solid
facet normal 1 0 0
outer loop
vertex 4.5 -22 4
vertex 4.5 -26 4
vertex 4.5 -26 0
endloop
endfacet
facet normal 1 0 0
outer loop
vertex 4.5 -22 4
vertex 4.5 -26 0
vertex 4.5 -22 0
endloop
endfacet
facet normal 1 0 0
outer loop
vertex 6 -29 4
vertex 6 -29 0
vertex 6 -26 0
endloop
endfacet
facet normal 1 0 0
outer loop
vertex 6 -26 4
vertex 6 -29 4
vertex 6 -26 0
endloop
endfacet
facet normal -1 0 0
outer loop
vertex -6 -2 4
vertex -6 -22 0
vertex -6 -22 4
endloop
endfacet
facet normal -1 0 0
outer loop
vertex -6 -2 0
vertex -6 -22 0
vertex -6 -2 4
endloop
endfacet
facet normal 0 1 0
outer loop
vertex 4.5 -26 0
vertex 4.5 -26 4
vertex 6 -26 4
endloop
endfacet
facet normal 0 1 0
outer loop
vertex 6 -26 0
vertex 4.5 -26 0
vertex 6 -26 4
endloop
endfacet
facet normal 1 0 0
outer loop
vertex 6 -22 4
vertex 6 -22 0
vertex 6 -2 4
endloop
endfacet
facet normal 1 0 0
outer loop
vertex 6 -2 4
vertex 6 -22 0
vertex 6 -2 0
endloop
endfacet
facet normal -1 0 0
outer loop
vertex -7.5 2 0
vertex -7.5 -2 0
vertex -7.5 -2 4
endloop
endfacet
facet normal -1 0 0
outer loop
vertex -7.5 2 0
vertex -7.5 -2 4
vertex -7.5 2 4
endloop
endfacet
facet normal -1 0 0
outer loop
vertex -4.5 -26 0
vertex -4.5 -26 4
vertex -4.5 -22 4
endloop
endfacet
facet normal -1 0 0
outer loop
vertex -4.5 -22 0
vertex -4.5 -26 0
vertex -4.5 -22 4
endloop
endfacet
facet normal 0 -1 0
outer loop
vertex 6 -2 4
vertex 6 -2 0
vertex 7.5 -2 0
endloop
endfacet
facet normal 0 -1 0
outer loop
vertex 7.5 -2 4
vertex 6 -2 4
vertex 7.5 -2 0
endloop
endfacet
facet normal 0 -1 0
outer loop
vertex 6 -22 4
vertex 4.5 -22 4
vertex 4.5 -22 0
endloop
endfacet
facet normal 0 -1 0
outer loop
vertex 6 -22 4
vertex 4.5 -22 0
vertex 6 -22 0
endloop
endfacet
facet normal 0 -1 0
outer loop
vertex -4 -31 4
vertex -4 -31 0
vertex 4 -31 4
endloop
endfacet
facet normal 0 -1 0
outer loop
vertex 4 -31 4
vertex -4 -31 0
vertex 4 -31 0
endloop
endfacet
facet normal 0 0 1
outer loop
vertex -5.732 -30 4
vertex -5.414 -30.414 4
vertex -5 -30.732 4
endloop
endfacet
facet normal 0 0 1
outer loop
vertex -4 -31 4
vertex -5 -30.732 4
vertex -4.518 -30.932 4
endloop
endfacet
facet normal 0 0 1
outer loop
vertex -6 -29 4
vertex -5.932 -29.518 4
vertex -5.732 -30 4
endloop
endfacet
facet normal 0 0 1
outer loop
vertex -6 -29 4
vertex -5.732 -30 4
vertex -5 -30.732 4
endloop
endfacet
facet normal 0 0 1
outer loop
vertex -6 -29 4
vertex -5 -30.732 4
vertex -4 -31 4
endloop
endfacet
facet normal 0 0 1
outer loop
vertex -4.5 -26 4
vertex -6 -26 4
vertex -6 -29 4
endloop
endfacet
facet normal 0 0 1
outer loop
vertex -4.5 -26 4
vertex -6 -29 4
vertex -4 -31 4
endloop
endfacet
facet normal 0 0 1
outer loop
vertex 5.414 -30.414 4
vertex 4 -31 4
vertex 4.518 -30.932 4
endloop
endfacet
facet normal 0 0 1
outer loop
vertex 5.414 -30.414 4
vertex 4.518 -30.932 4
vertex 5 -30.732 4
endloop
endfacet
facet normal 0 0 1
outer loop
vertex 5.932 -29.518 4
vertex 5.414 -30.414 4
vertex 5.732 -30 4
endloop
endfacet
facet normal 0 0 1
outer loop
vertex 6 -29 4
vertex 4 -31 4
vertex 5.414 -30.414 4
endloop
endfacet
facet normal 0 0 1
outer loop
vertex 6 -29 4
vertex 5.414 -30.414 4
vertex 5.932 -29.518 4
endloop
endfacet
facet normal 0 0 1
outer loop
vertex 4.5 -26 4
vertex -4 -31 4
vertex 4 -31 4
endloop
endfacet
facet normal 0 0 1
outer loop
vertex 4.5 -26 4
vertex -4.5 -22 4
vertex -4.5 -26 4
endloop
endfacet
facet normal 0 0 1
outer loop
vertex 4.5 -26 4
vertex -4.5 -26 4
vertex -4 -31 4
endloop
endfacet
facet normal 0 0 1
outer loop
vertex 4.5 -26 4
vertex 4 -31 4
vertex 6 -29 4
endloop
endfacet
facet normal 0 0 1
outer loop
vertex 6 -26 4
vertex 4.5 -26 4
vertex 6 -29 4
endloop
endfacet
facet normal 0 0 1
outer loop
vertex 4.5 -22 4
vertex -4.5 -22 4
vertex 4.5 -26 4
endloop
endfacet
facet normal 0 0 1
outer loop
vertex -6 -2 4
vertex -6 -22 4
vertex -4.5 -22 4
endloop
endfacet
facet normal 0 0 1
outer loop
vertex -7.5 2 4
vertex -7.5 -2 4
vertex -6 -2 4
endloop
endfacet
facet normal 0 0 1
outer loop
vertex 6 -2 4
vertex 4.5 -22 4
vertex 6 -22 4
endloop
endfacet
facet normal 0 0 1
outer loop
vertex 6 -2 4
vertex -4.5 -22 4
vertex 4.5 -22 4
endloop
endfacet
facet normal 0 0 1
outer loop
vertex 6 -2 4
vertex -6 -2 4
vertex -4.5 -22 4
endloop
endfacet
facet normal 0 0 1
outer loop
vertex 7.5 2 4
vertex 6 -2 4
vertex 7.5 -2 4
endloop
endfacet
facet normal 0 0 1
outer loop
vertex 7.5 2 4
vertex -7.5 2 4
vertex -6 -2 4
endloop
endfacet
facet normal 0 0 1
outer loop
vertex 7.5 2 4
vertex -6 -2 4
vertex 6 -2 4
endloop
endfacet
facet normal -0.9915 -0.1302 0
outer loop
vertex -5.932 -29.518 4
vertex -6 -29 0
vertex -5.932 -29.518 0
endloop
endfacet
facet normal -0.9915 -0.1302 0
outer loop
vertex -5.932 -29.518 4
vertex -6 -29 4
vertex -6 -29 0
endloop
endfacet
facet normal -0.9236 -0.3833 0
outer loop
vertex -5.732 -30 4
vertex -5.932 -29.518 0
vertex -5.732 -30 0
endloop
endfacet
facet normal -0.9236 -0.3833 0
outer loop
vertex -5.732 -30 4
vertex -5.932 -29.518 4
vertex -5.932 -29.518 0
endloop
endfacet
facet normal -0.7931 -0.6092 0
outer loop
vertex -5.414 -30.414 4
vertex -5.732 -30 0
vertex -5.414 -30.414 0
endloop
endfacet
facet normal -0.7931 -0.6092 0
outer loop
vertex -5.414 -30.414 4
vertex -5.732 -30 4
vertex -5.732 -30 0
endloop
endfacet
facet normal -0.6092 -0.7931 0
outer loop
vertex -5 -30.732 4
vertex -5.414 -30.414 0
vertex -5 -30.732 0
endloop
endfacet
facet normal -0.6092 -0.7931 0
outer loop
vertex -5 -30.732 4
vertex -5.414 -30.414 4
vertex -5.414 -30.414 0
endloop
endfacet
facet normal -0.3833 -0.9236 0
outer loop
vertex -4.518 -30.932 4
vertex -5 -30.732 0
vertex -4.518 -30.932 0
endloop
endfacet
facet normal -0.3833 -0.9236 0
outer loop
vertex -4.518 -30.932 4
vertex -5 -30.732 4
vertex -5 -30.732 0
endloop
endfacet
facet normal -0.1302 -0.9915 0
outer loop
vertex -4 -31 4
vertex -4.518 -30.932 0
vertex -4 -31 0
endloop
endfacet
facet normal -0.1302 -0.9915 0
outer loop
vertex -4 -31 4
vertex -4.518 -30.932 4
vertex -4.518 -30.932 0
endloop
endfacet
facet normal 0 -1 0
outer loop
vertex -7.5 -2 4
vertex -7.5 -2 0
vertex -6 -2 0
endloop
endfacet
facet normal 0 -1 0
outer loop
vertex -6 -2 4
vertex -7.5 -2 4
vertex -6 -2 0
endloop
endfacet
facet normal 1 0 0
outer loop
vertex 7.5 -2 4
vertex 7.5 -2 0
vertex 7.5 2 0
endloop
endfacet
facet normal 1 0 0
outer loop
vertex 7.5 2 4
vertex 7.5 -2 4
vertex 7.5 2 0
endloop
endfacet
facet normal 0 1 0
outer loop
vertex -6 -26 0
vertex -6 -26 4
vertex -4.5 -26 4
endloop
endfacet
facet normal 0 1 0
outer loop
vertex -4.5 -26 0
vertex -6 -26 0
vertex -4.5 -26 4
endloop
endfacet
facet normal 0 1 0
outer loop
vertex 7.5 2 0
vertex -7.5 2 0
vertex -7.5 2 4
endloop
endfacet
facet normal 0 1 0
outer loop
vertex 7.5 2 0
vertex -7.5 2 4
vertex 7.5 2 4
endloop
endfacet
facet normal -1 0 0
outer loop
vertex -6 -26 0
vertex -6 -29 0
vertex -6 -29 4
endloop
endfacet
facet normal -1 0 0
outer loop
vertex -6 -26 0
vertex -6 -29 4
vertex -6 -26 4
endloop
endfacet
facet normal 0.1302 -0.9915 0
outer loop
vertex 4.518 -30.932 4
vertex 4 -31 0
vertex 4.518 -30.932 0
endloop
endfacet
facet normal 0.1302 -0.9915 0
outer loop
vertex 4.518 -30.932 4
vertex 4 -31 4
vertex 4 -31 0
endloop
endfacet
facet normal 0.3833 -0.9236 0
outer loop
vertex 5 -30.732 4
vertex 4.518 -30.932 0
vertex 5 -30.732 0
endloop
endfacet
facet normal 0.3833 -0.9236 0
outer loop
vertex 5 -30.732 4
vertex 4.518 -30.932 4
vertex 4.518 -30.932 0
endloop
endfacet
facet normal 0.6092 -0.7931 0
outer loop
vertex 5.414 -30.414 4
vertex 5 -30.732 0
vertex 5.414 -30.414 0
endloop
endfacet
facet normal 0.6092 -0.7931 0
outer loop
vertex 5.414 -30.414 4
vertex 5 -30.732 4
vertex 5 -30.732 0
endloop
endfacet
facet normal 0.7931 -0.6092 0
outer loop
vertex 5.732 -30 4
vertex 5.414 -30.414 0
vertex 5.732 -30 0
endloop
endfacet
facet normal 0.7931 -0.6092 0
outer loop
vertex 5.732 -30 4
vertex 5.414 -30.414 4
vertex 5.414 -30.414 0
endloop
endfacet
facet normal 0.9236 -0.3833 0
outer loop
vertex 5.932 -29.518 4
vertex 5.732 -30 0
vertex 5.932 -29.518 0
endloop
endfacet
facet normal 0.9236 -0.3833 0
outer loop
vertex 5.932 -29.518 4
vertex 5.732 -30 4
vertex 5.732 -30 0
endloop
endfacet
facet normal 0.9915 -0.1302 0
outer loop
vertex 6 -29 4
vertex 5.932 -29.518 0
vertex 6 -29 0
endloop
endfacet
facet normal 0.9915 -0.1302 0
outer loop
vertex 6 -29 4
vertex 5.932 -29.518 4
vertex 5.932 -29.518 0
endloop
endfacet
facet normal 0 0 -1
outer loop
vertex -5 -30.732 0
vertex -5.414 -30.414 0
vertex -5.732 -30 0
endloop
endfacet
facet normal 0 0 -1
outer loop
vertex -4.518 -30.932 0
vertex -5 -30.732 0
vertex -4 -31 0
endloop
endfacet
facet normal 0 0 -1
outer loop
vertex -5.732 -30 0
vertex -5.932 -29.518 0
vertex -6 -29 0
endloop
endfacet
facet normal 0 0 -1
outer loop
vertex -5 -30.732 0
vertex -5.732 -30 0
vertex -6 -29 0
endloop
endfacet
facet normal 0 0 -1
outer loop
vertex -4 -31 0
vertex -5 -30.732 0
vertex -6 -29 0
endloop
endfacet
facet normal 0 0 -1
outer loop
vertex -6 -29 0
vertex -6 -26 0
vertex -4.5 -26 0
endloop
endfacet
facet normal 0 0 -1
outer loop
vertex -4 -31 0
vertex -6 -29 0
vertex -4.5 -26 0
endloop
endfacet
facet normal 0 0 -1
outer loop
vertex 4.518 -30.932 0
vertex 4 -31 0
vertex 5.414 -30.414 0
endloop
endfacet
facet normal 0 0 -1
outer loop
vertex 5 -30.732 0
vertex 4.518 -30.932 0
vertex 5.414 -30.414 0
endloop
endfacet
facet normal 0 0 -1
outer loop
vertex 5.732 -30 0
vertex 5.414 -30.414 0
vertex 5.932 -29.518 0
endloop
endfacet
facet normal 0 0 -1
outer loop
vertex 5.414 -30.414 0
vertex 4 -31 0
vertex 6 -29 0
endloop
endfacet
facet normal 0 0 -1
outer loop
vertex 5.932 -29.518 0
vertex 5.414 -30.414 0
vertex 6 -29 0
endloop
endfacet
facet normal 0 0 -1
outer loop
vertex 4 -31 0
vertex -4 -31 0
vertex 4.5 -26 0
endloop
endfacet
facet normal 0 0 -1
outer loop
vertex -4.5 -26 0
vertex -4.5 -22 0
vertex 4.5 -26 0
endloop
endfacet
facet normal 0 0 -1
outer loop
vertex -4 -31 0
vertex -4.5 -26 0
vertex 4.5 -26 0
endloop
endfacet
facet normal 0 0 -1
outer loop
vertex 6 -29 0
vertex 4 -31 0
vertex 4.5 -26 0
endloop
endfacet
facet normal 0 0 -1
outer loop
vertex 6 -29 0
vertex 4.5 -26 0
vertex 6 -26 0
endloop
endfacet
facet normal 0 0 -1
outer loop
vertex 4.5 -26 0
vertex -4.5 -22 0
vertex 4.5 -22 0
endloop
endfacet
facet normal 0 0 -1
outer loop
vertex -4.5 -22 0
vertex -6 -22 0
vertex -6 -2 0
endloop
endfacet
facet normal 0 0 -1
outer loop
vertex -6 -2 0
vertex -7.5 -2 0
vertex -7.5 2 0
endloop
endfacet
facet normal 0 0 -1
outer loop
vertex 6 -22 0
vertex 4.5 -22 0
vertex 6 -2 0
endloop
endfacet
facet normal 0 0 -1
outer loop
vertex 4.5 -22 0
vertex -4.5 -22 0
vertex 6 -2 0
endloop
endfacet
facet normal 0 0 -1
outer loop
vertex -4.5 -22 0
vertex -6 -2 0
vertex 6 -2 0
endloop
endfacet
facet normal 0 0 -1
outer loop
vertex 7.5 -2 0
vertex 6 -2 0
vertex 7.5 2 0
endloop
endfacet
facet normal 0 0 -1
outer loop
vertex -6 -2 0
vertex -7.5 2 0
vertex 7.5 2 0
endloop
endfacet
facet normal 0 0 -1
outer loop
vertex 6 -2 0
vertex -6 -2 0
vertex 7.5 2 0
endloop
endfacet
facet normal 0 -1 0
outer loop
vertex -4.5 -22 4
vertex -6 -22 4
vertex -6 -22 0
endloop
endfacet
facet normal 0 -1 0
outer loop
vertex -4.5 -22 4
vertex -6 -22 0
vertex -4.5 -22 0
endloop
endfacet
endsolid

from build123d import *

# Parameters (mm, degrees)
SKIZZE1_W                       = 12
SKIZZE1_H                       = 29
SKIZZE1_W_2                     = 15
SKIZZE1_H_2                     = 4
AUFSATZ_LINEAR_AUSTRAGEN1_DEPTH = 4
SKIZZE2_W                       = 1.5
SKIZZE2_H                       = 4
SCHNITT_LINEAR_AUSTRAGEN1_DEPTH = 5
VERRUNDUNG1_R                   = 2


with BuildPart() as part:
    # Skizze1 → Aufsatz-Linear austragen1 (new body)
    with BuildSketch(Plane.XY):
        with Locations((0, -16.5)):
            Rectangle(SKIZZE1_W, SKIZZE1_H)
        Rectangle(SKIZZE1_W_2, SKIZZE1_H_2)
    extrude(amount=AUFSATZ_LINEAR_AUSTRAGEN1_DEPTH)

    # Skizze2 → Schnitt-Linear austragen1 (cut, through all)
    with BuildSketch(Plane.XY.offset(4)):
        with Locations((-5.25, -24)):
            Rectangle(SKIZZE2_W, SKIZZE2_H)
        with Locations((5.25, -24)):
            Rectangle(SKIZZE2_W, SKIZZE2_H)
    extrude(amount=-SCHNITT_LINEAR_AUSTRAGEN1_DEPTH, mode=Mode.SUBTRACT)

    # Verrundung1
    verrundung1_edges = [part.edges().sort_by_distance(p)[0] for p in [
        (6, -31, 2),
        (-6, -31, 2),
    ]]
    fillet(verrundung1_edges, radius=VERRUNDUNG1_R)


solid = part.part
